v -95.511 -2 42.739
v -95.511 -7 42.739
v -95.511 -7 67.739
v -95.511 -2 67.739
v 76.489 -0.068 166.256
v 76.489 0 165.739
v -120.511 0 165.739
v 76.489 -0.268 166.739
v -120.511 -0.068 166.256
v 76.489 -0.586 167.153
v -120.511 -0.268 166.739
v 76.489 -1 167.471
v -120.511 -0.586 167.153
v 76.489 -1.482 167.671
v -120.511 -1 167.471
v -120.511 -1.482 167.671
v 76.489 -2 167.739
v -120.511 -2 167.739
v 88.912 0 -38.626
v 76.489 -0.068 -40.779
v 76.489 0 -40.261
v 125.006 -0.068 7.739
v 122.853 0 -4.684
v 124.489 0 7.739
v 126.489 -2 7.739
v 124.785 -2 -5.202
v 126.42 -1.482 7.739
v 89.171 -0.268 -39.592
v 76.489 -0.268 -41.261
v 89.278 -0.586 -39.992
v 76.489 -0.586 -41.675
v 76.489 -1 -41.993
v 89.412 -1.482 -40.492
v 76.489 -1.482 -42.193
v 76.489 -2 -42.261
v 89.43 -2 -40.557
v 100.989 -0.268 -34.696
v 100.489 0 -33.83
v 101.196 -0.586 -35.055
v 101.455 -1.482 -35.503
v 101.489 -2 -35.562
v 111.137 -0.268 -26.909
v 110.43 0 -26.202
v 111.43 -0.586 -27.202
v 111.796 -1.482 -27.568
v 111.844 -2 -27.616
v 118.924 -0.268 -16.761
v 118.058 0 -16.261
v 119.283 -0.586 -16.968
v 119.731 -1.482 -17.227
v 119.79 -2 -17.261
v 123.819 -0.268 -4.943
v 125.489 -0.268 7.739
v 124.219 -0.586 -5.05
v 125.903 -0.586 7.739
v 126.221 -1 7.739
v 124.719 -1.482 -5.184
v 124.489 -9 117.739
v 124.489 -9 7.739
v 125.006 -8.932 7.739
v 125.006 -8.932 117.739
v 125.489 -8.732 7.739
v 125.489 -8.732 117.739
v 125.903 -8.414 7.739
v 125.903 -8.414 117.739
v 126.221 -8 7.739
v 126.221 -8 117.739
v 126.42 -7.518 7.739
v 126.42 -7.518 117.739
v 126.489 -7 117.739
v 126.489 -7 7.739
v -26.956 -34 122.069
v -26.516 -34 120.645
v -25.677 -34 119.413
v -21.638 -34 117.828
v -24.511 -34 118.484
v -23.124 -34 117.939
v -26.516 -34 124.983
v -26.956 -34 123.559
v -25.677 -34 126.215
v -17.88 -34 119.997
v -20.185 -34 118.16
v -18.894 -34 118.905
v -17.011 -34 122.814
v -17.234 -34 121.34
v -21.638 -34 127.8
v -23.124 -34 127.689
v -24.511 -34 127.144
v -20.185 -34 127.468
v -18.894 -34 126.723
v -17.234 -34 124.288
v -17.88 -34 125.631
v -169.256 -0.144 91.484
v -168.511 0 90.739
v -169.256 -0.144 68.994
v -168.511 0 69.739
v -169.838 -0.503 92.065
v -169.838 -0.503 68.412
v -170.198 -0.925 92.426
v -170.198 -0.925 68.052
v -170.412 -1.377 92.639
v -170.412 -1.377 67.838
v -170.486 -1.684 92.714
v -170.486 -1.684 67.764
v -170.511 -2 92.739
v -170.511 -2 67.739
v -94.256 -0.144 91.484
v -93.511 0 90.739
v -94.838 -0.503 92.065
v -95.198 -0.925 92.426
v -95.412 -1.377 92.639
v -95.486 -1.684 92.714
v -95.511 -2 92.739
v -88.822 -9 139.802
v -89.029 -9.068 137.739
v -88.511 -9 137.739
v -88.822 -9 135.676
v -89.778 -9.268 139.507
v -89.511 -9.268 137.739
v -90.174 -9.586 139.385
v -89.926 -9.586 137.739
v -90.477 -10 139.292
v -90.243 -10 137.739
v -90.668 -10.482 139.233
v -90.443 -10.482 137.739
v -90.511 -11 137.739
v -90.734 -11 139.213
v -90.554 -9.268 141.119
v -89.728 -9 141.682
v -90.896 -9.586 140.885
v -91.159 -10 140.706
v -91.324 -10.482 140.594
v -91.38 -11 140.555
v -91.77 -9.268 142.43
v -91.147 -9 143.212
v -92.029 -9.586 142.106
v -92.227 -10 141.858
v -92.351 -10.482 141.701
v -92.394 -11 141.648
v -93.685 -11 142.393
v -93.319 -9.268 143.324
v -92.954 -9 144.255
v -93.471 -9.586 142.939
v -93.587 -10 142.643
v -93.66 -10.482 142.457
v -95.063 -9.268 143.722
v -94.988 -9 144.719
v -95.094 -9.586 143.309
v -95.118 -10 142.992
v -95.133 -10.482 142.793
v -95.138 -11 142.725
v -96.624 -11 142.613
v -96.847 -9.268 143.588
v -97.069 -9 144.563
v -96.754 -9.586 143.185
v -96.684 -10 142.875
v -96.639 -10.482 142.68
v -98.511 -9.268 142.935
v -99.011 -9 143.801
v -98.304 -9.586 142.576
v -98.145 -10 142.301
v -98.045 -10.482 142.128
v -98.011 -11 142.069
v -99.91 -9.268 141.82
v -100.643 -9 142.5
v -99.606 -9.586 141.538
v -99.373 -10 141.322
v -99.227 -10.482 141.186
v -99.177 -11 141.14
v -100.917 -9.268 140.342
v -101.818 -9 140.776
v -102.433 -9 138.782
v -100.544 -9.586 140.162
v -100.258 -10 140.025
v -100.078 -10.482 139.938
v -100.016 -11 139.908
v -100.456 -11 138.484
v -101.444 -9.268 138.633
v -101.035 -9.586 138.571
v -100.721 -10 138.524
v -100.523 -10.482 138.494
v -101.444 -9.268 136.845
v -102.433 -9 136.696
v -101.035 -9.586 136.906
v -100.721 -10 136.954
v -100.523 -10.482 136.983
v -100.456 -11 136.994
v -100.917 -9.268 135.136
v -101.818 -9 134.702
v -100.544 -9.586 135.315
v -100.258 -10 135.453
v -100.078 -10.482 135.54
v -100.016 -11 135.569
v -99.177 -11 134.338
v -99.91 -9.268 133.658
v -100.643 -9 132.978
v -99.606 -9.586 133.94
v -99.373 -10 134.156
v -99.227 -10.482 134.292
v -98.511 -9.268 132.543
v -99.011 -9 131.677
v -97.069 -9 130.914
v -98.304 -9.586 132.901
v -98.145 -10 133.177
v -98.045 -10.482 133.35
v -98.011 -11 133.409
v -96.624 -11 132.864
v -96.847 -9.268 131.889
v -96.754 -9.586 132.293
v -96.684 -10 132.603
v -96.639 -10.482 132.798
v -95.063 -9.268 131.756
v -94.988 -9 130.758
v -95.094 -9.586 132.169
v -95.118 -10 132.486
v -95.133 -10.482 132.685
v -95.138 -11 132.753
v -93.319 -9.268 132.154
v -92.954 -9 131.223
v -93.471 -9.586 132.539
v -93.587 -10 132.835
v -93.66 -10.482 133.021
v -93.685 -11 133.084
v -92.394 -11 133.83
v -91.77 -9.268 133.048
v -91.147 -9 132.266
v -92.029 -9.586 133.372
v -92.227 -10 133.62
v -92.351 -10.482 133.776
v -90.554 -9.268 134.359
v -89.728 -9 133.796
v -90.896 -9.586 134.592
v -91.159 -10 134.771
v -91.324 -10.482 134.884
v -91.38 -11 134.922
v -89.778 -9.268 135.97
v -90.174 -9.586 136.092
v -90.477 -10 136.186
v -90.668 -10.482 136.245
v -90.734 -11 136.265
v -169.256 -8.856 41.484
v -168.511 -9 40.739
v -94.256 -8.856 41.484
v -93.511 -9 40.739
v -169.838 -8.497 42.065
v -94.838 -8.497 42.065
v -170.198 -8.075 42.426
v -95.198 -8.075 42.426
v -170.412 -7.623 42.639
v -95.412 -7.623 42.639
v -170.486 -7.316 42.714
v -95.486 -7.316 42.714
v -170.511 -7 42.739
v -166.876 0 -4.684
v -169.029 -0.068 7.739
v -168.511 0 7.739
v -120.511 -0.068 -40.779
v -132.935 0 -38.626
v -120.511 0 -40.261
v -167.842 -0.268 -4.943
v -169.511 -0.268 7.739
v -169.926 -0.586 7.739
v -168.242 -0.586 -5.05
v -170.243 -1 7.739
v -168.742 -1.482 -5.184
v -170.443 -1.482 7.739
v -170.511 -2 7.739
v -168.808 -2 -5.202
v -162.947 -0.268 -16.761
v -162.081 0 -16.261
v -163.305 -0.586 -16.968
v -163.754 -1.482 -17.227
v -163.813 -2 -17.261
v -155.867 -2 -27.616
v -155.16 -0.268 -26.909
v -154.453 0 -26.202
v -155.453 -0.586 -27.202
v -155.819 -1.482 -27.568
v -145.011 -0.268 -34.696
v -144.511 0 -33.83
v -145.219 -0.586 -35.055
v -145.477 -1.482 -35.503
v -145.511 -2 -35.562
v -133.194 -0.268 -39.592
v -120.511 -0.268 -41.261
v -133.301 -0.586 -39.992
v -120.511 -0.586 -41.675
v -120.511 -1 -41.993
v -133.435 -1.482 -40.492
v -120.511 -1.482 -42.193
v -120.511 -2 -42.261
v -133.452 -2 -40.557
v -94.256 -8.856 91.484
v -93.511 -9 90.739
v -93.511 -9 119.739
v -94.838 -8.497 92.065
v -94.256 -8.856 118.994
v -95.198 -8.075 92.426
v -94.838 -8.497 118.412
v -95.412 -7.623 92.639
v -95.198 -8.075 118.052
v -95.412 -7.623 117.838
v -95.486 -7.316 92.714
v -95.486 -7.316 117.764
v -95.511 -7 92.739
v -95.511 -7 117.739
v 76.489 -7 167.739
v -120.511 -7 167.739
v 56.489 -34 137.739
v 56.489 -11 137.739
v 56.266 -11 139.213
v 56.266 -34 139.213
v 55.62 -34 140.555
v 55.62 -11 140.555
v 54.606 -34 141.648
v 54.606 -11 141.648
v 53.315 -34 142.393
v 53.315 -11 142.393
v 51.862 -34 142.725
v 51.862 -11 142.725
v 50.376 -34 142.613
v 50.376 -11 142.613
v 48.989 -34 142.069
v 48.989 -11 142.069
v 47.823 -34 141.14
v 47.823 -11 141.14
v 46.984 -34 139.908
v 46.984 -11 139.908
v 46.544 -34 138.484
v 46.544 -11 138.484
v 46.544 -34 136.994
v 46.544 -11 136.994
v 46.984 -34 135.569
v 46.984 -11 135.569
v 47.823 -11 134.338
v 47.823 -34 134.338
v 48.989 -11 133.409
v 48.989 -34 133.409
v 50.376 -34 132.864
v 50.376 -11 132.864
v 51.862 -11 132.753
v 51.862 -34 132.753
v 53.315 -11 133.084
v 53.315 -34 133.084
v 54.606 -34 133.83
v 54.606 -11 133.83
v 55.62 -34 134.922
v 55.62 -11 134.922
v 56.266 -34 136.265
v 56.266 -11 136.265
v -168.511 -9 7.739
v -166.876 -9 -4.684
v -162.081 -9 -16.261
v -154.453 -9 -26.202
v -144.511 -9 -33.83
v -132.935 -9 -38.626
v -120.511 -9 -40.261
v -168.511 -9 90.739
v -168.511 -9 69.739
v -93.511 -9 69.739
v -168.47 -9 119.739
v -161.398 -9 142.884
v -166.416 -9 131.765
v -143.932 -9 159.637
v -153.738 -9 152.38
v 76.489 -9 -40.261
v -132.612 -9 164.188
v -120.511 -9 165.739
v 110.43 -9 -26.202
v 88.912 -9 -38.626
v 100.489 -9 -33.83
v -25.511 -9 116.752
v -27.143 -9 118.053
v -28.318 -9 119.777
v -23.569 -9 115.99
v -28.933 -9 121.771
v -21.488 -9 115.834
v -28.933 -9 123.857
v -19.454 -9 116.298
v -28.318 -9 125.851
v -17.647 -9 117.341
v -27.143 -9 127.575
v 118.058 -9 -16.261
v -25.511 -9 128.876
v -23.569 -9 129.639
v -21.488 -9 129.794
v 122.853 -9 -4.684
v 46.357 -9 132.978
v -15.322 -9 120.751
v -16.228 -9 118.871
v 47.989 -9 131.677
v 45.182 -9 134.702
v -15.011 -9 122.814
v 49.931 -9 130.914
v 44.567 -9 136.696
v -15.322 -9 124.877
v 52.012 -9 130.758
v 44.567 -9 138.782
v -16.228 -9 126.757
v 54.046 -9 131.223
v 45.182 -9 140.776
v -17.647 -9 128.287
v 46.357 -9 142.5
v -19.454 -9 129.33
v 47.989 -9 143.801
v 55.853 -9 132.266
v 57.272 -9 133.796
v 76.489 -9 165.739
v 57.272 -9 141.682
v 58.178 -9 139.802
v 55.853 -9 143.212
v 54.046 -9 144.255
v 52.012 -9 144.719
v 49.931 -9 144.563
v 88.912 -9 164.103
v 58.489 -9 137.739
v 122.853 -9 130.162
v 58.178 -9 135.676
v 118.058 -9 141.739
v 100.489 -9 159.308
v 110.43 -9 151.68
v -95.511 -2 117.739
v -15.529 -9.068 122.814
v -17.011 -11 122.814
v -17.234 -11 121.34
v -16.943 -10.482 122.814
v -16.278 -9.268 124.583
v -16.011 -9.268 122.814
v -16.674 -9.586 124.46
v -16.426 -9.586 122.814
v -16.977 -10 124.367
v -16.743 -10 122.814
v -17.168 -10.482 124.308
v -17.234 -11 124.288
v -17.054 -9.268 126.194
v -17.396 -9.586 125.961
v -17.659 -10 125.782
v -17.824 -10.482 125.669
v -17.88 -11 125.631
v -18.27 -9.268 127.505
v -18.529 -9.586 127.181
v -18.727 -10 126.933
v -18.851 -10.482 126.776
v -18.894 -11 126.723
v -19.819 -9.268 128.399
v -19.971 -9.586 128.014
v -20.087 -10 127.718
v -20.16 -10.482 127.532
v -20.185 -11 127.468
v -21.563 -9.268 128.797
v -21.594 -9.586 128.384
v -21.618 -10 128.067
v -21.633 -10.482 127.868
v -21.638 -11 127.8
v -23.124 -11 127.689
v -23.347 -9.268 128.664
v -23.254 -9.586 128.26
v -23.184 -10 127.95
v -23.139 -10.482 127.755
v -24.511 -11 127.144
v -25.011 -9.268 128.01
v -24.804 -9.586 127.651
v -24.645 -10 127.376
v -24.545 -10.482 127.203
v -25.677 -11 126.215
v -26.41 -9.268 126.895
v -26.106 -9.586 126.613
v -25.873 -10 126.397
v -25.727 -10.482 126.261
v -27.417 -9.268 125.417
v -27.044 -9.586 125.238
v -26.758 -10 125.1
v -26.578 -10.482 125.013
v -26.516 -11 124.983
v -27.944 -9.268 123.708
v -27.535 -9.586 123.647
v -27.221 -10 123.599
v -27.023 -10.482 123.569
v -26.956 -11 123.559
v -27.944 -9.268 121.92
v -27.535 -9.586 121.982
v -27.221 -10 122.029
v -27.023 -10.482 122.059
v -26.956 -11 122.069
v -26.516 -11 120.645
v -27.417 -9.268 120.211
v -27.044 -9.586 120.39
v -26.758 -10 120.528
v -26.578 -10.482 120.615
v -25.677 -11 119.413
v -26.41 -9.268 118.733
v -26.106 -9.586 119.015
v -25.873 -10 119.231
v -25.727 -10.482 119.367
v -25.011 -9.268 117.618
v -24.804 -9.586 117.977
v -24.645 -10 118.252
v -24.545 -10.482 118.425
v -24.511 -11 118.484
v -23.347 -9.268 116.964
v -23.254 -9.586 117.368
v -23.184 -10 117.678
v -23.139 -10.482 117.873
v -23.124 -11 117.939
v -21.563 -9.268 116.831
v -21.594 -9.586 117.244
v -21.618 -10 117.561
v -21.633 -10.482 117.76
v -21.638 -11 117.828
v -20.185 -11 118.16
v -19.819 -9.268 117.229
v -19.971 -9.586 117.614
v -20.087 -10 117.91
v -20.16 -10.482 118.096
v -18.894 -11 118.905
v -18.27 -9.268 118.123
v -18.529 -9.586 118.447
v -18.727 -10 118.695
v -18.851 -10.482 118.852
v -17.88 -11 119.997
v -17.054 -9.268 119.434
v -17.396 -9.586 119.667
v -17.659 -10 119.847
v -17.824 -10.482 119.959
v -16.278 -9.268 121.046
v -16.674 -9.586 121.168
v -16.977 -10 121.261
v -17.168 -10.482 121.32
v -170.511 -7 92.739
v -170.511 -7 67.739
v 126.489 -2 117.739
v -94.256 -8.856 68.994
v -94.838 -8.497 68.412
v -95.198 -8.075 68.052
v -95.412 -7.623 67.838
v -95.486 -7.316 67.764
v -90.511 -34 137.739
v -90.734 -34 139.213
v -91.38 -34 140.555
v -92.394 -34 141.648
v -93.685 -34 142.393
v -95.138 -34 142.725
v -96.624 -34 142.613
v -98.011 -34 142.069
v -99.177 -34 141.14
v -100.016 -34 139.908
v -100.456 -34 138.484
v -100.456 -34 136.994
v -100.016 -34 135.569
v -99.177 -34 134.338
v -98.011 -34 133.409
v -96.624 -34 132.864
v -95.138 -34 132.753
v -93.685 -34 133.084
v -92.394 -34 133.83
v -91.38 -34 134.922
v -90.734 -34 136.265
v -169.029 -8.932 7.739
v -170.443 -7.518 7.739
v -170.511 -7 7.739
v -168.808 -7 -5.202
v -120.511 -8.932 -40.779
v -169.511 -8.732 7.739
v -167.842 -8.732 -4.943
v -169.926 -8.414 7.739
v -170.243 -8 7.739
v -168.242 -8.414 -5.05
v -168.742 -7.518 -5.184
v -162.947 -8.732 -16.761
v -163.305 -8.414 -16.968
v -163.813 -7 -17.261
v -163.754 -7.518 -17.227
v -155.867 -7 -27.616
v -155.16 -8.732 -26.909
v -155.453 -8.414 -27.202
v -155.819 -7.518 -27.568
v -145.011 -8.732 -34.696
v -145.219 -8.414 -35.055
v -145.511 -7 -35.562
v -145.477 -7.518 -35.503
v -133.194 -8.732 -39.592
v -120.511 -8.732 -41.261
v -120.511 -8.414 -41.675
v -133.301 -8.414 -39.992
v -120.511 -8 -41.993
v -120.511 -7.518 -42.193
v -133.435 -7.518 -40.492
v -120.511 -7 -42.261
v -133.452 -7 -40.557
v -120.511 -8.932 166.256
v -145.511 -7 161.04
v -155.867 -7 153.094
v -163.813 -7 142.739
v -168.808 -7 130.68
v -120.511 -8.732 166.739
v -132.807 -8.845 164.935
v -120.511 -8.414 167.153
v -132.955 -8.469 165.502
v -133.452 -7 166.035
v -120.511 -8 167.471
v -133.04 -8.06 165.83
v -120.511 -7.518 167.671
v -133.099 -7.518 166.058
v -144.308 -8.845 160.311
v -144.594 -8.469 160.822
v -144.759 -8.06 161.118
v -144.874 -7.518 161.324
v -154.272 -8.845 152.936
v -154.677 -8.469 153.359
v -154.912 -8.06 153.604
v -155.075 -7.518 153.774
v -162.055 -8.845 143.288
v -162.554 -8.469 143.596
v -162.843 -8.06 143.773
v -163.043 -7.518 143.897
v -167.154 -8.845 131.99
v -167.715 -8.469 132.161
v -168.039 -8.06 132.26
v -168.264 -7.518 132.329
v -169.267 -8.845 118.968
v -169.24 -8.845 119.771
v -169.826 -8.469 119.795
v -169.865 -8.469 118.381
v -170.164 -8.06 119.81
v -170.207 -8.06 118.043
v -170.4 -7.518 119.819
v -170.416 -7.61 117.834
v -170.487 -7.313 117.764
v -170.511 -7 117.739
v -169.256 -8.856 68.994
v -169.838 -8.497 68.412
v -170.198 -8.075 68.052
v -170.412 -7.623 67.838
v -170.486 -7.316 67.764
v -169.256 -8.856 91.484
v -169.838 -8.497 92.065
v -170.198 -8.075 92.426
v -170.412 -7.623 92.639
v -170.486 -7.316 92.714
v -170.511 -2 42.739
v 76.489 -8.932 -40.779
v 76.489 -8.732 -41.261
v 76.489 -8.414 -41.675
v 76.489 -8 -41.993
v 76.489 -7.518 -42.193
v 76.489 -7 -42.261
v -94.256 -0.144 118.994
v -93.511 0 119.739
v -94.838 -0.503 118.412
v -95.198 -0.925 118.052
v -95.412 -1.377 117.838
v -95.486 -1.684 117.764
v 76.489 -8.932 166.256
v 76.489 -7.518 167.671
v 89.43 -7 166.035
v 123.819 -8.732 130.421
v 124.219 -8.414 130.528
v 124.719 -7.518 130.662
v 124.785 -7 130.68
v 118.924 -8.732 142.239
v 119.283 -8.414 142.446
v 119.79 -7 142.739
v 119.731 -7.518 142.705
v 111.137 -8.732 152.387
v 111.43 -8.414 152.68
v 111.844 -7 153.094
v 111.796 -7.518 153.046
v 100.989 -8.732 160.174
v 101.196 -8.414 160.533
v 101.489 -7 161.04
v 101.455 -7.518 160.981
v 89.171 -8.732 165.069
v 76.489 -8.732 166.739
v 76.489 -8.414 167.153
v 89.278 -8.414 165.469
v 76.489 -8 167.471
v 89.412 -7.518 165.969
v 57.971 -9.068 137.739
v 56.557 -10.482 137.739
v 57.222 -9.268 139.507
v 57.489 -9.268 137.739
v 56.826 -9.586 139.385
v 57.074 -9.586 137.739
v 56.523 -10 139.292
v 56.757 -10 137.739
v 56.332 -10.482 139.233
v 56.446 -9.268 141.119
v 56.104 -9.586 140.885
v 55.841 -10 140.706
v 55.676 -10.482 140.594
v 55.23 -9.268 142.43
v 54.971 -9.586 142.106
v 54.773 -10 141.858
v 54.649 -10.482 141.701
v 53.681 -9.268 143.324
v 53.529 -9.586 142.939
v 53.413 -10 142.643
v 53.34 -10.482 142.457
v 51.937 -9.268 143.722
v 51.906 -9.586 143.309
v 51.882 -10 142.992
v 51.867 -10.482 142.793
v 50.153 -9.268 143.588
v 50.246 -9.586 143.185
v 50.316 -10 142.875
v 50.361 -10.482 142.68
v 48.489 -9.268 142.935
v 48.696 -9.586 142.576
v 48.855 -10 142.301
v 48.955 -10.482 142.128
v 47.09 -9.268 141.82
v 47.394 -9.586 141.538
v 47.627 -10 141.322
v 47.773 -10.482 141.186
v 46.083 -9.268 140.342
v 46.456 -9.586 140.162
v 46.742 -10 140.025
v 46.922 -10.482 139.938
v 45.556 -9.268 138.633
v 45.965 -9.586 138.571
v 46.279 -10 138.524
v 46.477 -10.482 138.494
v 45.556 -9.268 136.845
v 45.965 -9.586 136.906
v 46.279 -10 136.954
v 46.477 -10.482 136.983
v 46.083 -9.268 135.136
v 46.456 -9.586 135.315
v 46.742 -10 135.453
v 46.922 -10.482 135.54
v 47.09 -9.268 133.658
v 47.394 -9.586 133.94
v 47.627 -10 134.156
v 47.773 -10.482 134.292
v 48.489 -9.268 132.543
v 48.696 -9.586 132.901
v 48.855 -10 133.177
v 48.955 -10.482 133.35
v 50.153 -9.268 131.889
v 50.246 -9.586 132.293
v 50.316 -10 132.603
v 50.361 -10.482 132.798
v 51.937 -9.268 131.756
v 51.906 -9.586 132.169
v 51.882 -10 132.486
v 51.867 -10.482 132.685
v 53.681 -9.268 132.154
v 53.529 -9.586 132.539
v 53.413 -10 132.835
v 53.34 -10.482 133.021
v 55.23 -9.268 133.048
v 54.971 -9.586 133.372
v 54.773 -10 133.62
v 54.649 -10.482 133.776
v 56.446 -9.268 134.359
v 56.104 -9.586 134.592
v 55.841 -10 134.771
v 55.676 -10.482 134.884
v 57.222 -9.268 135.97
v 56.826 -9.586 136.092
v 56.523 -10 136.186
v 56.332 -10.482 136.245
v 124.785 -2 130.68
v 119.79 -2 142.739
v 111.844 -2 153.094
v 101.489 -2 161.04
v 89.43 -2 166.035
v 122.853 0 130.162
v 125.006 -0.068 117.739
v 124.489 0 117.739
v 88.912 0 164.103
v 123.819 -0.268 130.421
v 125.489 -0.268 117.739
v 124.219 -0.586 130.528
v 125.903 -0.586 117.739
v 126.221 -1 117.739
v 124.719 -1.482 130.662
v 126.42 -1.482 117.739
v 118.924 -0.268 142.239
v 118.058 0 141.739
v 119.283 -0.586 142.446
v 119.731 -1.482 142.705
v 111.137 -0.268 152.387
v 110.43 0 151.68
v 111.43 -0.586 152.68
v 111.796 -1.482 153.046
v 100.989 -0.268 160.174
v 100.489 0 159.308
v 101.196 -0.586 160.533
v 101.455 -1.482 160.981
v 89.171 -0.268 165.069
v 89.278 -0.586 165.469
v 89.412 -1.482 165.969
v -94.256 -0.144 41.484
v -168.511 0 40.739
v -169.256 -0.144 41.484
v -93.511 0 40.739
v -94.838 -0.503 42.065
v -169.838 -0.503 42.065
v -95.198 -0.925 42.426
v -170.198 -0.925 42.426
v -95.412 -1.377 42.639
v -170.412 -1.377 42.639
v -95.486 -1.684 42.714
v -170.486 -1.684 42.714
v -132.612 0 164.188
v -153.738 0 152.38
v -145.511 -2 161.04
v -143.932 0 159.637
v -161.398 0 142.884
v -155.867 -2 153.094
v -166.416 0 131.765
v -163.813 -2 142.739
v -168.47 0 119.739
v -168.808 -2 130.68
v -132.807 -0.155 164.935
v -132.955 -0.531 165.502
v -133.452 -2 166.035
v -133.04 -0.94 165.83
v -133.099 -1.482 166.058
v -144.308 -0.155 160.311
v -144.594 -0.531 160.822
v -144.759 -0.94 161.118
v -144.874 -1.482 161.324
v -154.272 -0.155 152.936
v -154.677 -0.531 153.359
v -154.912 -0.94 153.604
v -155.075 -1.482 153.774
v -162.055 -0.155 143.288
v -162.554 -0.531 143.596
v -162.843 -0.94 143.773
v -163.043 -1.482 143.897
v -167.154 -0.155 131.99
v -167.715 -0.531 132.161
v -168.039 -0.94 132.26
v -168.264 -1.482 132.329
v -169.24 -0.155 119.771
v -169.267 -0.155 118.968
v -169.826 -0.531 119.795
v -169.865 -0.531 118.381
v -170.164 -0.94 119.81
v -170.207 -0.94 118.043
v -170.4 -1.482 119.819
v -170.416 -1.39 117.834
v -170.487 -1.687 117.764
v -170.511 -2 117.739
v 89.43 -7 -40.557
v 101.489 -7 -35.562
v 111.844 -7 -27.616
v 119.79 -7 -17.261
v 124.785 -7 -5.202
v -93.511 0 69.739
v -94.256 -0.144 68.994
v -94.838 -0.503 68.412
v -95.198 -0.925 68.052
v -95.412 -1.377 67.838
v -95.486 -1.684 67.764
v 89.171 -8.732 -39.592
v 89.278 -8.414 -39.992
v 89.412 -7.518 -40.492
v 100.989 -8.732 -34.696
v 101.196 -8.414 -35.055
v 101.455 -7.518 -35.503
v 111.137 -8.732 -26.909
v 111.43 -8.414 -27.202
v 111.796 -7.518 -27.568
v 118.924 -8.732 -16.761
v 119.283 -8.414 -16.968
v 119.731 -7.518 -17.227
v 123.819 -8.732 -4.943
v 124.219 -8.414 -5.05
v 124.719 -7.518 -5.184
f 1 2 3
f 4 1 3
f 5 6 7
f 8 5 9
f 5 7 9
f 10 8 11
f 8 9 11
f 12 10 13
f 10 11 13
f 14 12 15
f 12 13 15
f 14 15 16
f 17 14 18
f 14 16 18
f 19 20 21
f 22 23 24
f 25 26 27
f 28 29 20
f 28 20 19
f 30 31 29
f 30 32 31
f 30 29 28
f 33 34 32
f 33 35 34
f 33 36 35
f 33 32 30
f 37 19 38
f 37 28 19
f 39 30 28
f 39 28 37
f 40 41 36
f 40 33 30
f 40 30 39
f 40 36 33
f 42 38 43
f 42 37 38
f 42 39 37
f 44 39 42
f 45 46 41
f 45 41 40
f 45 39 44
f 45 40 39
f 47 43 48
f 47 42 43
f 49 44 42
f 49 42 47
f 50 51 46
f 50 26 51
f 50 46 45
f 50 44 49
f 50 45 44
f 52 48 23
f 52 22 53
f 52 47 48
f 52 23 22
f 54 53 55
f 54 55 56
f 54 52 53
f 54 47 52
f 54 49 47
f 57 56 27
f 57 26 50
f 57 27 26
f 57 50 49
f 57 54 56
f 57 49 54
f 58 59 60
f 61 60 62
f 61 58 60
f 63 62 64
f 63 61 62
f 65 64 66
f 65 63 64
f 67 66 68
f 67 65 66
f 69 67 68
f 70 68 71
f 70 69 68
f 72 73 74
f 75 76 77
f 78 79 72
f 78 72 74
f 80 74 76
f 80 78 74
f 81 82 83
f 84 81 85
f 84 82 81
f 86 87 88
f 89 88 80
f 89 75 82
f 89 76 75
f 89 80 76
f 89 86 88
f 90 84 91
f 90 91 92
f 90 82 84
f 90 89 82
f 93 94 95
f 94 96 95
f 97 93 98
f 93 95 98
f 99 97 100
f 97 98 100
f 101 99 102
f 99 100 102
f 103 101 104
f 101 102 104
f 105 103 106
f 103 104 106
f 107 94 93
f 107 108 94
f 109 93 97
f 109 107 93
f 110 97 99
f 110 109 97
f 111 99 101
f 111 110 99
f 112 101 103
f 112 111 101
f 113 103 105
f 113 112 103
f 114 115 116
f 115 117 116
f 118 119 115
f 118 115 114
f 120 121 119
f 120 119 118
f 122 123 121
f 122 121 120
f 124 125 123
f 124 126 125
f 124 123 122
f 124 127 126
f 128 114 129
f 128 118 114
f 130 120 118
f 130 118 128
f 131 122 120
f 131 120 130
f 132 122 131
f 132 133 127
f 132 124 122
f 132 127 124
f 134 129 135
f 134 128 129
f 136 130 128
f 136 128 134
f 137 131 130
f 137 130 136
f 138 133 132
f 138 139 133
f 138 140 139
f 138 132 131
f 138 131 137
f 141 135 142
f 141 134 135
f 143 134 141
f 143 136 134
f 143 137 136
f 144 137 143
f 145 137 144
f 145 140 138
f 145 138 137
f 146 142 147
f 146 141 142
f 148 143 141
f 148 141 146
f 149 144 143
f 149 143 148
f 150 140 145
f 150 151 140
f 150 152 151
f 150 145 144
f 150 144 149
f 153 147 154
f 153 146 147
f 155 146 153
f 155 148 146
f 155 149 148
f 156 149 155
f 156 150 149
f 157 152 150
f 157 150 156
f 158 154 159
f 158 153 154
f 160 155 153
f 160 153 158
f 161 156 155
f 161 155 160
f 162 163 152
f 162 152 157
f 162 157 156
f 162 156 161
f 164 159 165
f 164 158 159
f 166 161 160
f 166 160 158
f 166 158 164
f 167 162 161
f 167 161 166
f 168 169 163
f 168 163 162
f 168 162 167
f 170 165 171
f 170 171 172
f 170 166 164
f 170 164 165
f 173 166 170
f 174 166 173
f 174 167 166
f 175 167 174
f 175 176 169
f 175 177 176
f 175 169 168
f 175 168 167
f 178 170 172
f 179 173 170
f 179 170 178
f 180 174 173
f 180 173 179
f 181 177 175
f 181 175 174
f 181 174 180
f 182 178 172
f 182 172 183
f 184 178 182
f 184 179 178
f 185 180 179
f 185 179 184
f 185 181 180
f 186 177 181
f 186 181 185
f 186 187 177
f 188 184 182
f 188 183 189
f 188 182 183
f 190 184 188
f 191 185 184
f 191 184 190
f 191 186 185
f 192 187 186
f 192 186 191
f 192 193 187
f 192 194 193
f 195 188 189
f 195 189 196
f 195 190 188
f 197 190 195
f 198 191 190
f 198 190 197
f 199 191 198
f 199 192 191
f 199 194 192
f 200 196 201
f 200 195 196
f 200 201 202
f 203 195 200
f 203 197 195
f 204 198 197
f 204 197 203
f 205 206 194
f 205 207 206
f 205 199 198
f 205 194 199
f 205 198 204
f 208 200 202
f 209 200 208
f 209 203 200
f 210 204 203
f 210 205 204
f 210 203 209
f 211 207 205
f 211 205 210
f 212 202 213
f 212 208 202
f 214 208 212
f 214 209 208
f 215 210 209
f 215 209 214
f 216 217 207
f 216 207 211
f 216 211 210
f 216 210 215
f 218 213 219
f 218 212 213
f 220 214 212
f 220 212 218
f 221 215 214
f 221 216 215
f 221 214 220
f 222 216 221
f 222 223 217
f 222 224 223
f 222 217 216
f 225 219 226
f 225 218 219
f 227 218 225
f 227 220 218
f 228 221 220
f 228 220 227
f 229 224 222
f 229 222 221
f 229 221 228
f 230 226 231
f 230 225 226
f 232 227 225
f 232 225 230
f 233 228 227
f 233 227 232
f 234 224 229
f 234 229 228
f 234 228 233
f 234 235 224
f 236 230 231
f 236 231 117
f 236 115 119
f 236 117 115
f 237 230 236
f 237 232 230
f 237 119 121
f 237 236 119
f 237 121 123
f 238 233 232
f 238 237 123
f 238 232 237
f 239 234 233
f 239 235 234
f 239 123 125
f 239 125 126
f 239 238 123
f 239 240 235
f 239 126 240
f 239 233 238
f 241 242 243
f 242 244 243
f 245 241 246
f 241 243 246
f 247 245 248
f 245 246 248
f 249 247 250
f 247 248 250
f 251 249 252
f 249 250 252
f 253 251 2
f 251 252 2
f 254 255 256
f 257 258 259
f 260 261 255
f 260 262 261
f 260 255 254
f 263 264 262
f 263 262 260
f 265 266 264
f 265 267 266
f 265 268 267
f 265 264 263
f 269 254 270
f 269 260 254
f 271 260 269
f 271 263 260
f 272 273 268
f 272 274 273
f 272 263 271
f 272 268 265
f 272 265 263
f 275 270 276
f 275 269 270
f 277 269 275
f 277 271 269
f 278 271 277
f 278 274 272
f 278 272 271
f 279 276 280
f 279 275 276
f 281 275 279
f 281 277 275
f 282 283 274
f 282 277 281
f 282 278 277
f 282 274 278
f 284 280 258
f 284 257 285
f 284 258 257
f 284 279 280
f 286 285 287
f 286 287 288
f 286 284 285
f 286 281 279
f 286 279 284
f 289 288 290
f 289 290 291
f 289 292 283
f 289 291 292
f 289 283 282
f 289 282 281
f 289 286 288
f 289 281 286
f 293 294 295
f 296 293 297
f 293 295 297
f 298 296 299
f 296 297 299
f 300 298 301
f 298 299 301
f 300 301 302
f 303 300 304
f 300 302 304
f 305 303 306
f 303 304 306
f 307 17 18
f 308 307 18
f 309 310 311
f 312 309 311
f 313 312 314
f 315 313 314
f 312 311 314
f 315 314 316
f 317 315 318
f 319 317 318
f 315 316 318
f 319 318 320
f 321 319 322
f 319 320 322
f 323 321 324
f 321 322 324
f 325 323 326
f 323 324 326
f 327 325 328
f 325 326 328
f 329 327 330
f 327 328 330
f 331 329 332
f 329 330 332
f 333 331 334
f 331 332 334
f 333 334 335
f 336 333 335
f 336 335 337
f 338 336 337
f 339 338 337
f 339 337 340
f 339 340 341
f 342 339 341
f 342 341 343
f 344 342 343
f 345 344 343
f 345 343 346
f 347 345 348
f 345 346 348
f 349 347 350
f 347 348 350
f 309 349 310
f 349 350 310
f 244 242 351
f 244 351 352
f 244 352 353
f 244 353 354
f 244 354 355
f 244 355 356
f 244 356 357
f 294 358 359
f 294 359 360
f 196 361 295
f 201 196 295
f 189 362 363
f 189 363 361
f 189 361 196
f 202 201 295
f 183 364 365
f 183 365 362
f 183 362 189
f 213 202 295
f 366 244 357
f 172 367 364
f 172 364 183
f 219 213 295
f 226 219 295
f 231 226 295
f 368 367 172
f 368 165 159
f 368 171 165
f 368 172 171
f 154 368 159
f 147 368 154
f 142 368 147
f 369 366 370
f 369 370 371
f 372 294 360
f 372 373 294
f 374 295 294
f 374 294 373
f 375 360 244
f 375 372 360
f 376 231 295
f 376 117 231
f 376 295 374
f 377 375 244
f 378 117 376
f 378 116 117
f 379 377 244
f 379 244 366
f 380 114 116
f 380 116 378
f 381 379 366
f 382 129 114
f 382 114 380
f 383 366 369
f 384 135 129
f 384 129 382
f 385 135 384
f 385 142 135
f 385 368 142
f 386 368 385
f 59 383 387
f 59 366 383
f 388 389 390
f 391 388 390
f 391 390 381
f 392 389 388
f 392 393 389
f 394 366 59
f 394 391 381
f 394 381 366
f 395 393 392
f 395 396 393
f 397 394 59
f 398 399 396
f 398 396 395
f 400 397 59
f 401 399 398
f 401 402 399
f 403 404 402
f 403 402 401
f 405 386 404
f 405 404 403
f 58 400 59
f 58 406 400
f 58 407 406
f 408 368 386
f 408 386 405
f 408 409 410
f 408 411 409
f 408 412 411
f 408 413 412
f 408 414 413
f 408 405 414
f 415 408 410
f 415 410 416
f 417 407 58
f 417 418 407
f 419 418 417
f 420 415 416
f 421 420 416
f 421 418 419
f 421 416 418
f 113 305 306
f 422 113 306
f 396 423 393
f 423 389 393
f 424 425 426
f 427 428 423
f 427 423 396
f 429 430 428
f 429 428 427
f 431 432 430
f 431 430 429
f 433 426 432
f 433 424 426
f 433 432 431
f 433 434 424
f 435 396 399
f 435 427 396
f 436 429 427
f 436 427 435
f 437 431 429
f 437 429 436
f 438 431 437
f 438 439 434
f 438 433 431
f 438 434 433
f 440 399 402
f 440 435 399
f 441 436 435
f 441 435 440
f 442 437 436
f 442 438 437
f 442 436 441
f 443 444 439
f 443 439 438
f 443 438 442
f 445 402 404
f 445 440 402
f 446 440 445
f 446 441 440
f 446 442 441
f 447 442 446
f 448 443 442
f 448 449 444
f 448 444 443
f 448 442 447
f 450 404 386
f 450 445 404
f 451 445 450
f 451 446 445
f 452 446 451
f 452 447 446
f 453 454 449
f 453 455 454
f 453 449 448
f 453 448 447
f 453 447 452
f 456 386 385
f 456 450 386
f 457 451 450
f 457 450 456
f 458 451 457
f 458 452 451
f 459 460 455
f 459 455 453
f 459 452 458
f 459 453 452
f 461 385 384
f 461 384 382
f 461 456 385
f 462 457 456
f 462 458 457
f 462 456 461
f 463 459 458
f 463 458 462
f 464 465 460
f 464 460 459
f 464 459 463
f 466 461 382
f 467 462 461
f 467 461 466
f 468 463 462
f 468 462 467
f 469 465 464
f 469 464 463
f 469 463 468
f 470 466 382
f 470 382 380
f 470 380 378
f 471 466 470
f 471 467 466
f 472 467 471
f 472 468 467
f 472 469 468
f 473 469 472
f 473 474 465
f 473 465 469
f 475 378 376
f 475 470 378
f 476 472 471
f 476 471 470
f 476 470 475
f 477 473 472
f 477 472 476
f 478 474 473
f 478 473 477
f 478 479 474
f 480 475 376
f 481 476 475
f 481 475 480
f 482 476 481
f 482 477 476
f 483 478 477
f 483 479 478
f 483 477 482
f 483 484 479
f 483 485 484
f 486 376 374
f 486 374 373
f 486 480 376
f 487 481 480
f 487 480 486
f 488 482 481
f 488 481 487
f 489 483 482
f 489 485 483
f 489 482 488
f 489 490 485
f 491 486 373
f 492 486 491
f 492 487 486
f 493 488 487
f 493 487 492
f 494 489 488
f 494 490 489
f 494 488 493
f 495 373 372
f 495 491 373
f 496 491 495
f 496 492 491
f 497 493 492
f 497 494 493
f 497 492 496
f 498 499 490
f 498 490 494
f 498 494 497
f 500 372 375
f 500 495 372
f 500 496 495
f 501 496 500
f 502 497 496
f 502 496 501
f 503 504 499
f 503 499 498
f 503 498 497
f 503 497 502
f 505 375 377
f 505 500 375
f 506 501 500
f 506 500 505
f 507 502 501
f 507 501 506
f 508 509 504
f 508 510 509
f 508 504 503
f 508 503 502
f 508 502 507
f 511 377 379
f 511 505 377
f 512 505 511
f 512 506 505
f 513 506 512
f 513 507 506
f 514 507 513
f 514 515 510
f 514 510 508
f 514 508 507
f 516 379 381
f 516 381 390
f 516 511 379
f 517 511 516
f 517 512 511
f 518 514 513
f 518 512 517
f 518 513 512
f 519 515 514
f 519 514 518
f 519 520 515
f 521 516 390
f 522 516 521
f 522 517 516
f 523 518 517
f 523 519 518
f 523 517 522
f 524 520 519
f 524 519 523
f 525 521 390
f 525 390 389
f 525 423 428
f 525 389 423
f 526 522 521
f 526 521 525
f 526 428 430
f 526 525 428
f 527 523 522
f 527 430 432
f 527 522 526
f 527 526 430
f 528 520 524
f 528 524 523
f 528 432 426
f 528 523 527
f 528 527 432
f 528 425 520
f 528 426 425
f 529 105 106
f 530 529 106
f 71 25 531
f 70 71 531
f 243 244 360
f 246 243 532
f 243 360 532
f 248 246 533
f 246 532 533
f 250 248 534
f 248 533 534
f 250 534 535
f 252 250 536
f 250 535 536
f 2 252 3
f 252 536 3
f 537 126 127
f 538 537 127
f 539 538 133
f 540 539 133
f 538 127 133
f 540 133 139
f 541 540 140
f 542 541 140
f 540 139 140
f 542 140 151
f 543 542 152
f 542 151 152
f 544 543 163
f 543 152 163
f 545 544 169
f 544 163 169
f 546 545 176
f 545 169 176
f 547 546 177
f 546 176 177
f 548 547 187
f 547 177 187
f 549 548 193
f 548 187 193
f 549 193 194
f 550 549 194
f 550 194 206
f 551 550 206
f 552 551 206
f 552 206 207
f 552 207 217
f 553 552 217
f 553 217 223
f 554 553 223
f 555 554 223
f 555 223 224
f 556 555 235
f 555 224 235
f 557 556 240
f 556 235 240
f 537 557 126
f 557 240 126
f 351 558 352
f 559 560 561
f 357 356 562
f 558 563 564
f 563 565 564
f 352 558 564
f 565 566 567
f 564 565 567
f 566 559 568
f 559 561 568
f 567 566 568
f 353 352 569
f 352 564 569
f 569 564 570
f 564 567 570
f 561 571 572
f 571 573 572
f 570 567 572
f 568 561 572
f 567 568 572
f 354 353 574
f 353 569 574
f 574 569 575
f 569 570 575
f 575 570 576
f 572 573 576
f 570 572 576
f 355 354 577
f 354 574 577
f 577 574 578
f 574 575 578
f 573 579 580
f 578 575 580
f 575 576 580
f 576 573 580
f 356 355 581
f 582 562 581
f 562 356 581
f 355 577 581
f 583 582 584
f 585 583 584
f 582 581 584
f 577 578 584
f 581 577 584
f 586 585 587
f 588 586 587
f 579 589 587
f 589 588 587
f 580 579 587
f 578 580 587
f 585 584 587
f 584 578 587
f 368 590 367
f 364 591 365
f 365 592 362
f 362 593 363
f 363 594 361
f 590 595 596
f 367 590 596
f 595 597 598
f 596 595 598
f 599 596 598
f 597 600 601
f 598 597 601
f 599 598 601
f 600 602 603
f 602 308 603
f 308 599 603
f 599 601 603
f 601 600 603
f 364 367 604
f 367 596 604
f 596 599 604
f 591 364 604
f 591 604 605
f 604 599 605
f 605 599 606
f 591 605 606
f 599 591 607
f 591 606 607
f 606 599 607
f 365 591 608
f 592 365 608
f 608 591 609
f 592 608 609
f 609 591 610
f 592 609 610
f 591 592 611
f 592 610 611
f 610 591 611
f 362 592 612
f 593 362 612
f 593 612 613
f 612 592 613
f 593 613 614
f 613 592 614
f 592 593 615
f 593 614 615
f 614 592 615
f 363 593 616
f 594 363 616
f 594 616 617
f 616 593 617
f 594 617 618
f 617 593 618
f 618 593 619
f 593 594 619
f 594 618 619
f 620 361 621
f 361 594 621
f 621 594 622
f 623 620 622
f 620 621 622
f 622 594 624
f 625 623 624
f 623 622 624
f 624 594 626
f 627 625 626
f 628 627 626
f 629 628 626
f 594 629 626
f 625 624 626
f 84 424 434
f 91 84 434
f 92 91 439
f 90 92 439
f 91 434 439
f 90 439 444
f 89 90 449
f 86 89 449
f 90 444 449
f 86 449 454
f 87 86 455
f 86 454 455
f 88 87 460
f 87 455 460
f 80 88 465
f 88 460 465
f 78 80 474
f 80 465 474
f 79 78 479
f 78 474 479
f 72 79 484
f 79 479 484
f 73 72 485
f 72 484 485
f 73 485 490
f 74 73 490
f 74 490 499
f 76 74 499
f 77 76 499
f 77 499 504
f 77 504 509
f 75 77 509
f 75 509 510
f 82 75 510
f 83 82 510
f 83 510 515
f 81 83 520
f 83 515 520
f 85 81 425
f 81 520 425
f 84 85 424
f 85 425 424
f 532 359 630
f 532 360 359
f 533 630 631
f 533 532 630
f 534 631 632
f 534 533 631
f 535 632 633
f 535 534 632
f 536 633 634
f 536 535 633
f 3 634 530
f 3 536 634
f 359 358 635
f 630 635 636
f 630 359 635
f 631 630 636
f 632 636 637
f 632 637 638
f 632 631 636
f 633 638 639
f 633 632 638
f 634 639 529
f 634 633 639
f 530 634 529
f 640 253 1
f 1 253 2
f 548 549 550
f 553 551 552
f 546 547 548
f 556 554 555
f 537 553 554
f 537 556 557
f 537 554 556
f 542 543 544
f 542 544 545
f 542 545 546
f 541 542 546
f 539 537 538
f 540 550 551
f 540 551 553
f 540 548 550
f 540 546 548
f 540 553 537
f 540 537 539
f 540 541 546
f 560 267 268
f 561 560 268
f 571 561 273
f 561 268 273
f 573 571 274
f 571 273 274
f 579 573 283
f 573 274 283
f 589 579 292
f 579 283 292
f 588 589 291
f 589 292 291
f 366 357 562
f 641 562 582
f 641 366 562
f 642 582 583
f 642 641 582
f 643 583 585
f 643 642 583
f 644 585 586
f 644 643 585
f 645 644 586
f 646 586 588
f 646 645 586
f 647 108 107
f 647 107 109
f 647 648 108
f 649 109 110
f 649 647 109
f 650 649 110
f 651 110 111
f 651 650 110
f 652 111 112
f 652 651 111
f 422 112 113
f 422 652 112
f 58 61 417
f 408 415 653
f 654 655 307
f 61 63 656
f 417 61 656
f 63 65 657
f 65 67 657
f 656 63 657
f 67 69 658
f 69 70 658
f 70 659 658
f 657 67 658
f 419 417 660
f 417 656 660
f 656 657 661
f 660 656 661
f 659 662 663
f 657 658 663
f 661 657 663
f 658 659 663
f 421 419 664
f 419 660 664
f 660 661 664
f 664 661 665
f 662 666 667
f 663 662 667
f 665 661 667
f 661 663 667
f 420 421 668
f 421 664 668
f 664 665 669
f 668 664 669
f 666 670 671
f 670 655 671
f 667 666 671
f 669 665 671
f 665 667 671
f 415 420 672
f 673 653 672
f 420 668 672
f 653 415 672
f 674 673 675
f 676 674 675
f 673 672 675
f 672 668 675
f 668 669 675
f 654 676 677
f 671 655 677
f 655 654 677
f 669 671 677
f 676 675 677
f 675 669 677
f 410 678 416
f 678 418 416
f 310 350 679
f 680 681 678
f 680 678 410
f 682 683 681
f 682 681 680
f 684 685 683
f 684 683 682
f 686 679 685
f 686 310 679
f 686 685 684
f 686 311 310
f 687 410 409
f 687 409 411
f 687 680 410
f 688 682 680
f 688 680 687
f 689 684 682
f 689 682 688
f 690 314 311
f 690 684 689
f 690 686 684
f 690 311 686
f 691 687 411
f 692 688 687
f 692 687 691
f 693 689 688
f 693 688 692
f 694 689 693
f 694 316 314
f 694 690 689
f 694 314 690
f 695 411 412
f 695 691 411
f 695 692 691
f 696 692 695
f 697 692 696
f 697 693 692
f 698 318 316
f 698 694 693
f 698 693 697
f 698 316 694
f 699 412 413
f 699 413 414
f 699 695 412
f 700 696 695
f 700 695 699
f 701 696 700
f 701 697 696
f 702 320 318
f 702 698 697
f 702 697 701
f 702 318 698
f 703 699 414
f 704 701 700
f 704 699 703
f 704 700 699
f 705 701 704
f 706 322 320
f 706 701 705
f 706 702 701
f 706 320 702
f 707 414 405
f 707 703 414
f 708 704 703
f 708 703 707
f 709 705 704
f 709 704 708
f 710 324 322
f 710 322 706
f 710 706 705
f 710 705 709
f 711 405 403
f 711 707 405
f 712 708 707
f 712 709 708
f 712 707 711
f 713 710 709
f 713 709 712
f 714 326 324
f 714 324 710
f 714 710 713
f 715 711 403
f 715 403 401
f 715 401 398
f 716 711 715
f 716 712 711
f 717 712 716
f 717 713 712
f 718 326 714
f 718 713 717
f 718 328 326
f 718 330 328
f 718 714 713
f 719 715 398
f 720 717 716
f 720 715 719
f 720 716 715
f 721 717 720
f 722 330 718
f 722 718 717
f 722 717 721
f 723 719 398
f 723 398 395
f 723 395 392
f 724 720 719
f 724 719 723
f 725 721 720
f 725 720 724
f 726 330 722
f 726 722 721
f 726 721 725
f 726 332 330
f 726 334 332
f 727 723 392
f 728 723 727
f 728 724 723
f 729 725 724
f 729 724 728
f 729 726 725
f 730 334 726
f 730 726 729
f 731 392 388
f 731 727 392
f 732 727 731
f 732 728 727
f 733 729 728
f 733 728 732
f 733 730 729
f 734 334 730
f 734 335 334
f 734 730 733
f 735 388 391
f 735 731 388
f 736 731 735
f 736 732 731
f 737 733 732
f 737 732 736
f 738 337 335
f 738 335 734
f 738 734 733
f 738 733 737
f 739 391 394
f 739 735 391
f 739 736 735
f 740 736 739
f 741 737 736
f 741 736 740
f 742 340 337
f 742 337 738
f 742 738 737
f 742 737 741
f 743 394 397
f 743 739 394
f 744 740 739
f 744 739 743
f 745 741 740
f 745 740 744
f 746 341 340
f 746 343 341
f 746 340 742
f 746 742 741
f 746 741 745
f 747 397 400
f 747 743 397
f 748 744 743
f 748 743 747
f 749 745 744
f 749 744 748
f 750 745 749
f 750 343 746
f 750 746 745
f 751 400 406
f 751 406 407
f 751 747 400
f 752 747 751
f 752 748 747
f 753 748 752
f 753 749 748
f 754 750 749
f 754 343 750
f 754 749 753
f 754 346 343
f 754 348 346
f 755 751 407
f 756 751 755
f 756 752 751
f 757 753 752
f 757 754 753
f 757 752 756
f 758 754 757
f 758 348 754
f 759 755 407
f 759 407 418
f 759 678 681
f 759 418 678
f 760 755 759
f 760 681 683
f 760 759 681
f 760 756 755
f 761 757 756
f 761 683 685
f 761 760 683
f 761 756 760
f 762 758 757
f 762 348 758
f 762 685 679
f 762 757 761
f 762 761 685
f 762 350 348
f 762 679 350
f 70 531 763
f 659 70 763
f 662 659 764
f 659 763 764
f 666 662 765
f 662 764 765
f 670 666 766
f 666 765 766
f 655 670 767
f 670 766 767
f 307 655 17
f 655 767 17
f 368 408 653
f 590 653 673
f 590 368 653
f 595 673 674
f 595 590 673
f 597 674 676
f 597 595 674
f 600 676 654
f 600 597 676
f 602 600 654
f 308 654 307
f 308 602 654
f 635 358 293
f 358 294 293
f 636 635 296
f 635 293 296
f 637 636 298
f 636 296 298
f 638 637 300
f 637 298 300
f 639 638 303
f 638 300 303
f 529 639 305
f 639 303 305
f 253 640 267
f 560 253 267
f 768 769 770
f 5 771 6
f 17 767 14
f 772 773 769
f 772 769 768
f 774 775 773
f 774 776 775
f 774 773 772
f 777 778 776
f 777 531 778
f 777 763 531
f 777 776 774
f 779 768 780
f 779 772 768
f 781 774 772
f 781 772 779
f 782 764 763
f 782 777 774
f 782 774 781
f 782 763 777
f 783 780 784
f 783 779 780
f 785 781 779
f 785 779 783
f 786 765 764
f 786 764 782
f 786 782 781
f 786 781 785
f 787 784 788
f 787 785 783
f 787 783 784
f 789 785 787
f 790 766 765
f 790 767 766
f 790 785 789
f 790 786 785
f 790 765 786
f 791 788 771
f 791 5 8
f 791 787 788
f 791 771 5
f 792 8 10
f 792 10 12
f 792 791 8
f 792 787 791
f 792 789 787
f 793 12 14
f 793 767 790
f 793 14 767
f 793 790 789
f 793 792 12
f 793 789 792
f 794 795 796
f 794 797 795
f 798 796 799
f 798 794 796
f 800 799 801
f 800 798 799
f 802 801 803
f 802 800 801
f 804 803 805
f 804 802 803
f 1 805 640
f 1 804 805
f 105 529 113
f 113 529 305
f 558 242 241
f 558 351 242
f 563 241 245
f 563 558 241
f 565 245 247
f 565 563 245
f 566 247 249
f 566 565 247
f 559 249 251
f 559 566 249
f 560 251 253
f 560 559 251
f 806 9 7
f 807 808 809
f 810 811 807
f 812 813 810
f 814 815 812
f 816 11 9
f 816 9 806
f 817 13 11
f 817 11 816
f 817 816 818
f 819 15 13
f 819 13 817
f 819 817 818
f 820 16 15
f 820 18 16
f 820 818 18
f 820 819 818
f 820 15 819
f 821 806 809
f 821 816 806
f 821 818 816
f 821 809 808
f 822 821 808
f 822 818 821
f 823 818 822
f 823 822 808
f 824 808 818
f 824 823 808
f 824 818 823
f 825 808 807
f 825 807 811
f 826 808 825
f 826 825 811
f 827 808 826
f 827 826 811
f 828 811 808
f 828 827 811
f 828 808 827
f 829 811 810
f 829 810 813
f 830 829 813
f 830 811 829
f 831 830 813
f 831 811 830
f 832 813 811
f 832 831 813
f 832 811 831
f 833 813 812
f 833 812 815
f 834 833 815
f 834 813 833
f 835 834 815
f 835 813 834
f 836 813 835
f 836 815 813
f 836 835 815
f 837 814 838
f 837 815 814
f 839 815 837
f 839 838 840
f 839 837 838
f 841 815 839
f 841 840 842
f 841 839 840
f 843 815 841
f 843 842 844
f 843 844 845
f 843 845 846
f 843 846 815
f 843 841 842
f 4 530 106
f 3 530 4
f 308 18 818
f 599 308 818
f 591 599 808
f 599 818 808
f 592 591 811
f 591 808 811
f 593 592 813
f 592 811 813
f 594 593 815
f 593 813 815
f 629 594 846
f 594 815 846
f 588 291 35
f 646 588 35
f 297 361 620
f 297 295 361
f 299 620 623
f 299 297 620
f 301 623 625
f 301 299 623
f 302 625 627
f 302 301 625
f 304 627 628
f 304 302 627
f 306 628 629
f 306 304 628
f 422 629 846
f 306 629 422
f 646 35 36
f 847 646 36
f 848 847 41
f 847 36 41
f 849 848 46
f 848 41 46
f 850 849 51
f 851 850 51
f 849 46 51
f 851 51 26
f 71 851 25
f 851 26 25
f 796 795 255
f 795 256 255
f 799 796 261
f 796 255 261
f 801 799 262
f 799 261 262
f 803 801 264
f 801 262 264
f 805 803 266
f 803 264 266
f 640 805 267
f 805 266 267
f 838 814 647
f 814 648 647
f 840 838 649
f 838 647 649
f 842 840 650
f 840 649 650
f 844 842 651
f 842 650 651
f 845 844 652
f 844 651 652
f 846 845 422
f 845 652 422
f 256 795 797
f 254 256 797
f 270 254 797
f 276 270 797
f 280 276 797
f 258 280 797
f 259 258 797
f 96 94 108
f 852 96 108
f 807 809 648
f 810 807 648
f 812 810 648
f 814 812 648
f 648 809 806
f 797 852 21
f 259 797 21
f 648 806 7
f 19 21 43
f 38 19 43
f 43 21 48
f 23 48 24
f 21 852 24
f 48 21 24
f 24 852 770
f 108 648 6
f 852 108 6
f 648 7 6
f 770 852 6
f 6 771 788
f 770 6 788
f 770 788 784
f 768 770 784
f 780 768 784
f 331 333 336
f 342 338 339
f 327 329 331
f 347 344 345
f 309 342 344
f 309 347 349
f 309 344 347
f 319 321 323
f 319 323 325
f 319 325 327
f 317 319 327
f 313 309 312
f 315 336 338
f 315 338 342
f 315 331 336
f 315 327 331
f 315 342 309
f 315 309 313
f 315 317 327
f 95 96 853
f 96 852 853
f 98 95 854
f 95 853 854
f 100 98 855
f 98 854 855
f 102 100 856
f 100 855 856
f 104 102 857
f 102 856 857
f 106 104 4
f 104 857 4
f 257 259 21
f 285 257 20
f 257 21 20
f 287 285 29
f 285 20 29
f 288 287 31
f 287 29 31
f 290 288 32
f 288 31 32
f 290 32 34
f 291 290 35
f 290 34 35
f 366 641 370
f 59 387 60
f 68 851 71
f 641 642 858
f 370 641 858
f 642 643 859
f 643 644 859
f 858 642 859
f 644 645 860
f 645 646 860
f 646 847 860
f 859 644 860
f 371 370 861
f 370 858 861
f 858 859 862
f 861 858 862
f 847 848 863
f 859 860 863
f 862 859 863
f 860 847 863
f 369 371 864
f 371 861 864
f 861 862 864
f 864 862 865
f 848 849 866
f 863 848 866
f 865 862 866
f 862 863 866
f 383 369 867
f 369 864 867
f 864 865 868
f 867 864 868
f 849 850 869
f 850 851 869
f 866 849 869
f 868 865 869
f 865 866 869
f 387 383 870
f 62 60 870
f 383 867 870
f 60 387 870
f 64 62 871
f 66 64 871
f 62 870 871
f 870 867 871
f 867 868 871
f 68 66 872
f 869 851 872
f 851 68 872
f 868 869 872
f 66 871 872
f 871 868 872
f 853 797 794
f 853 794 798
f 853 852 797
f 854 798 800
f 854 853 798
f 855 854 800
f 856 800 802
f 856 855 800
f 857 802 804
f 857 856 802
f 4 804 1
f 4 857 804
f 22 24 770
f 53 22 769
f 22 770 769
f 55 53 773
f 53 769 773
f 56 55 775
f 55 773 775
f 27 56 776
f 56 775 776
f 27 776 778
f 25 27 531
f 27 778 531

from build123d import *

# Parameters (mm, degrees)
F1_DEPTH = 9
F2_R     = 5
F3_DEPTH = 25
F4_W     = 75
F4_H     = 25
F5_DEPTH = 25
F6_R     = 2


with BuildPart() as f1:
    # F0 (on Front) → F1 (new body)
    with BuildSketch(Plane.XZ):
        with BuildLine():
            Line((76.488592, 167.738855), (-120.511408, 167.738855))
            ThreePointArc((-120.511408, 167.738855), (-155.866747, 153.094194), (-170.511408, 117.738855))
            Line((-170.511408, 117.738855), (-170.511408, 7.738855))
            ThreePointArc((-170.511408, 7.738855), (-155.866747, -27.616484), (-120.511408, -42.261145))
            Line((-120.511408, -42.261145), (76.488592, -42.261145))
            ThreePointArc((76.488592, -42.261145), (111.843931, -27.616484), (126.488592, 7.738855))
            Line((126.488592, 7.738855), (126.488592, 117.738855))
            ThreePointArc((126.488592, 117.738855), (111.843931, 153.094194), (76.488592, 167.738855))
        make_face()
    extrude(amount=F1_DEPTH)

    # F2 (on face) → F3 (join)
    with BuildSketch(Plane.XZ.offset(9)):
        with Locations((-95.511408, 137.738855)):
            Circle(F2_R)
        with Locations((-22.011408, 122.814043)):
            Circle(F2_R)
        with Locations((51.488592, 137.738855)):
            Circle(F2_R)
    extrude(amount=F3_DEPTH)

    # F4 (on face) → F5 (cut)
    with BuildSketch(Plane.XZ.offset(9)):
        with Locations((-133.011408, 105.238855)):
            Rectangle(F4_W, F4_H)
        with Locations((-133.011408, 55.238855)):
            Rectangle(F4_W, F4_H)
    extrude(amount=-F5_DEPTH, mode=Mode.SUBTRACT)

    # F6
    f6_edges = [f1.edges().sort_by_distance(p)[0] for p in [
        (111.843931, -9, -27.616484),
        (-22.011408, -9, -42.261145),
        (-155.866747, -9, -27.616484),
        (-170.511408, -9, 25.238855),
        (-133.011408, -9, 42.738855),
        (-95.511408, -9, 55.238855),
        (-133.011408, -9, 67.738855),
        (-170.511408, -9, 80.238855),
        (-133.011408, -9, 92.738855),
        (-95.511408, -9, 105.238855),
        (-133.011408, -9, 117.738855),
        (-155.866747, -9, 153.094194),
        (-22.011408, -9, 167.738855),
        (111.843931, -9, 153.094194),
        (126.488592, -9, 62.738855),
        (-27.011408, -9, 122.814043),
        (-100.511408, -9, 137.738855),
        (46.488592, -9, 137.738855),
        (111.843931, 0, -27.616484),
        (-22.011408, 0, -42.261145),
        (-155.866747, 0, -27.616484),
        (-170.511408, 0, 25.238855),
        (-133.011408, 0, 42.738855),
        (-95.511408, 0, 55.238855),
        (-133.011408, 0, 67.738855),
        (-170.511408, 0, 80.238855),
        (-133.011408, 0, 92.738855),
        (-95.511408, 0, 105.238855),
        (-133.011408, 0, 117.738855),
        (-155.866747, 0, 153.094194),
        (-22.011408, 0, 167.738855),
        (111.843931, 0, 153.094194),
        (126.488592, 0, 62.738855),
    ]]
    fillet(f6_edges, radius=F6_R)


solid = f1.part
